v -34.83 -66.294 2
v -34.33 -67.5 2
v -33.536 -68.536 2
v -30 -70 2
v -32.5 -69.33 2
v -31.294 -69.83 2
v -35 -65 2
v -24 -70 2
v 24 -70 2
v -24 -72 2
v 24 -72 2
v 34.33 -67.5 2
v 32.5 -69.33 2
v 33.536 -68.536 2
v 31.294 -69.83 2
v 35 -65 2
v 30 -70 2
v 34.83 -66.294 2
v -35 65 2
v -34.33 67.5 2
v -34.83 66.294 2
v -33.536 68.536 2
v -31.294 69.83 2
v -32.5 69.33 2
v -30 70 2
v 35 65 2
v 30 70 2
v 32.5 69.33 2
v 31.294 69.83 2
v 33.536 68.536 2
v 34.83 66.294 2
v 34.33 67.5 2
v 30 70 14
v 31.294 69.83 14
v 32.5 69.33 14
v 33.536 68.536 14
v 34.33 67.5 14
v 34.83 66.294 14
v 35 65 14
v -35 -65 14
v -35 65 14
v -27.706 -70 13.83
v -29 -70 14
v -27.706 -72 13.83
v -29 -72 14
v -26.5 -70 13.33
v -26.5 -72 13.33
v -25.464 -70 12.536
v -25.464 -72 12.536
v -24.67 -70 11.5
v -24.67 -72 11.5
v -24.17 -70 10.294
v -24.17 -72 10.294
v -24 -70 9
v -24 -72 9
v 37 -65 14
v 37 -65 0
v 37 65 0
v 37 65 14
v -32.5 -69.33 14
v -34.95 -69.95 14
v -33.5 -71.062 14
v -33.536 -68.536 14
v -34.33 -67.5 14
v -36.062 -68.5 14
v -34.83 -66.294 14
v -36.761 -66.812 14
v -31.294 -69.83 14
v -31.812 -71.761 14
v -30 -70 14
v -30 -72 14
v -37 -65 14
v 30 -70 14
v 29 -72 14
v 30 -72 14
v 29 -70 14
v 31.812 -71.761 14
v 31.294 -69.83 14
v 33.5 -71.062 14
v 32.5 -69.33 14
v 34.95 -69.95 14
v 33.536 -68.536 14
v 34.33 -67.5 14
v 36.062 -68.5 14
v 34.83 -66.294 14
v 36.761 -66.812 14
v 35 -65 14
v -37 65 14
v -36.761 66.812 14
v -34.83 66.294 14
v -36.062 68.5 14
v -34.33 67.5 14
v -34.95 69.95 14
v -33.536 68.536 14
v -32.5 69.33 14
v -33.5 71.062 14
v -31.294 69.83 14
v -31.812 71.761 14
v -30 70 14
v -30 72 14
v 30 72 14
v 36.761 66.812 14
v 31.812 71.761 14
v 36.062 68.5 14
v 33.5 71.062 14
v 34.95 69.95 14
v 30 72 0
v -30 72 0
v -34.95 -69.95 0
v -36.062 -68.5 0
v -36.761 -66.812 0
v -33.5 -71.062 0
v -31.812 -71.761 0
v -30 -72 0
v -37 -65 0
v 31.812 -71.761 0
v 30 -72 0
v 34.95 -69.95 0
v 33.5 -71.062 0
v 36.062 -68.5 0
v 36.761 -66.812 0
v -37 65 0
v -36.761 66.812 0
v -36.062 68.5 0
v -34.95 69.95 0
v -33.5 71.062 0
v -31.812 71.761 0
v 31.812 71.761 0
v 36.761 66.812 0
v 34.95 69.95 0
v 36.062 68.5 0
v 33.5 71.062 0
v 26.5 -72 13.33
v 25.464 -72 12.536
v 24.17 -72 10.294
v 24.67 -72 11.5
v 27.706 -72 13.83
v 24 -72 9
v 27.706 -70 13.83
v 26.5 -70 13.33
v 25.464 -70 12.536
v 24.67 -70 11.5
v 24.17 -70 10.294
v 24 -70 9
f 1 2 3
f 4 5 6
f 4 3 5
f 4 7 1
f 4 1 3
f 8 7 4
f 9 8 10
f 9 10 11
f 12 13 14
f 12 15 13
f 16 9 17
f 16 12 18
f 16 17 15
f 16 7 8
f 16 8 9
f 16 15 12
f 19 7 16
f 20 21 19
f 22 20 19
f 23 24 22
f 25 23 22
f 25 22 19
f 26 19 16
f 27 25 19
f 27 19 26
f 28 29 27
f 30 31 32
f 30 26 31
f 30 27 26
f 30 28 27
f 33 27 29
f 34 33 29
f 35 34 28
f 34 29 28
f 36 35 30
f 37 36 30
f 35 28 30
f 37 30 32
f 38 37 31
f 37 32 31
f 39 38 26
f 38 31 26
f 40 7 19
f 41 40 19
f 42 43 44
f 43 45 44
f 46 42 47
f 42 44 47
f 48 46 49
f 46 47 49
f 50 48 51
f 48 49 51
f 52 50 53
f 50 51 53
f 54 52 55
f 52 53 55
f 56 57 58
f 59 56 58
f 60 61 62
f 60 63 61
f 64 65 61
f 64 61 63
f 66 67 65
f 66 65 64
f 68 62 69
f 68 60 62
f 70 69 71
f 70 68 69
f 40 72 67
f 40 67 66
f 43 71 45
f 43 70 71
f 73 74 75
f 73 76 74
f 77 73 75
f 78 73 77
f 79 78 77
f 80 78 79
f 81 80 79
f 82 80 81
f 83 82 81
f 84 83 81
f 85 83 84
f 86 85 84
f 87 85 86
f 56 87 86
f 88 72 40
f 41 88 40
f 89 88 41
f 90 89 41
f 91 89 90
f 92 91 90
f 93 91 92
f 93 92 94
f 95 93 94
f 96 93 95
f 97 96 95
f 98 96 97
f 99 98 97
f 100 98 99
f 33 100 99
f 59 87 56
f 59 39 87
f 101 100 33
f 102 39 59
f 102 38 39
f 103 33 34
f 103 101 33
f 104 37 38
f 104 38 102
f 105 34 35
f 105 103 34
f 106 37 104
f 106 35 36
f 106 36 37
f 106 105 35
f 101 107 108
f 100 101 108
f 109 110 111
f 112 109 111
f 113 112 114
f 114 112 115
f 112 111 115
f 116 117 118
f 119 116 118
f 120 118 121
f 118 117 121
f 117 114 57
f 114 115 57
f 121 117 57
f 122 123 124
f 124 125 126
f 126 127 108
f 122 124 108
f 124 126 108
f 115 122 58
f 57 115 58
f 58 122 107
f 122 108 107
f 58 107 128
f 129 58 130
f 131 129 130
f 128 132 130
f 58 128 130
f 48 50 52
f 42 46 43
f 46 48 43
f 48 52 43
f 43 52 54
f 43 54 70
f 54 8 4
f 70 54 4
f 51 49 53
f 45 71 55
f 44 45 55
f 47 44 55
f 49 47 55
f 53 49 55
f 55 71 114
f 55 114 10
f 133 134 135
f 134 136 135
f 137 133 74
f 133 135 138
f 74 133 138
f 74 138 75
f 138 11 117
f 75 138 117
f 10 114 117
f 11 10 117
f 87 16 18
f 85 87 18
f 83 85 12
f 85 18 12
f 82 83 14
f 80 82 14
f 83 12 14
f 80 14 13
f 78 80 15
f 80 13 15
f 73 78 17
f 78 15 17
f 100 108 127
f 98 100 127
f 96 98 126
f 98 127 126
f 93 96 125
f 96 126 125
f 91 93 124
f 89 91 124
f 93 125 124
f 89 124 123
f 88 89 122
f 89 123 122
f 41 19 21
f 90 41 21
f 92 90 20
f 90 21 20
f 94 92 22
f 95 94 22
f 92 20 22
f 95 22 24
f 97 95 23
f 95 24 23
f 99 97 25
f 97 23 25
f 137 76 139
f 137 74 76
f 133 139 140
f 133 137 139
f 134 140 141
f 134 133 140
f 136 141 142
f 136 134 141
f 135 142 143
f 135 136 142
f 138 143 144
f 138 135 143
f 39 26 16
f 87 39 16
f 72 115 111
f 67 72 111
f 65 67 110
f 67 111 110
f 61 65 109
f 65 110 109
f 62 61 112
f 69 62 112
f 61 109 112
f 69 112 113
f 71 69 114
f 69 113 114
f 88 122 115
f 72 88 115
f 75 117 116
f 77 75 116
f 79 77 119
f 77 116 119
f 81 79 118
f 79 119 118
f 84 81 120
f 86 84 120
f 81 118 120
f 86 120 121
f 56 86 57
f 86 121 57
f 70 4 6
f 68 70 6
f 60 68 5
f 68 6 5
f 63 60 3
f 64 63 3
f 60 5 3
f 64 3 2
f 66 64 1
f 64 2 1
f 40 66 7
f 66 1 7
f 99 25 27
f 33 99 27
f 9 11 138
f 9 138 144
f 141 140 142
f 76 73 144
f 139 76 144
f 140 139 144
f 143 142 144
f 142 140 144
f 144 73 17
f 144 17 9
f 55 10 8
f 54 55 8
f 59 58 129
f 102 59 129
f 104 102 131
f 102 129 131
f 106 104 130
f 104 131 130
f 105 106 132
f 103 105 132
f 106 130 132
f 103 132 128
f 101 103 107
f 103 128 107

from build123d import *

# Parameters (mm, degrees)
F1_DEPTH = 2
F2_DEPTH = 14
F3_W     = 48
F3_H     = 15.884124
F4_DEPTH = 25
F5_R     = 5


with BuildPart() as f1:
    # F0 (on Top) → F1 (new body)
    with BuildSketch(Plane.XY):
        with BuildLine():
            ThreePointArc((37, 65), (34.949747, 69.949747), (30, 72))
            Line((30, 72), (-30, 72))
            ThreePointArc((-30, 72), (-34.949747, 69.949747), (-37, 65))
            Line((-37, 65), (-37, -65))
            ThreePointArc((-37, -65), (-34.949747, -69.949747), (-30, -72))
            Line((-30, -72), (30, -72))
            ThreePointArc((30, -72), (34.949747, -69.949747), (37, -65))
            Line((37, -65), (37, 65))
        make_face()
        with BuildLine():
            Line((-30, 70), (30, 70))
            ThreePointArc((30, 70), (33.535534, 68.535534), (35, 65))
            Line((35, 65), (35, -65))
            ThreePointArc((35, -65), (33.535534, -68.535534), (30, -70))
            Line((30, -70), (-30, -70))
            ThreePointArc((-30, -70), (-33.535534, -68.535534), (-35, -65))
            Line((-35, -65), (-35, 65))
            ThreePointArc((-35, 65), (-33.535534, 68.535534), (-30, 70))
        make_face(mode=Mode.SUBTRACT)
        with BuildLine():
            ThreePointArc((35, 65), (33.535534, 68.535534), (30, 70))
            Line((30, 70), (-30, 70))
            ThreePointArc((-30, 70), (-33.535534, 68.535534), (-35, 65))
            Line((-35, 65), (-35, -65))
            ThreePointArc((-35, -65), (-33.535534, -68.535534), (-30, -70))
            Line((-30, -70), (30, -70))
            ThreePointArc((30, -70), (33.535534, -68.535534), (35, -65))
            Line((35, -65), (35, 65))
        make_face()
    extrude(amount=F1_DEPTH)

    # F0 (on Top) → F2 (join)
    with BuildSketch(Plane.XY):
        with BuildLine():
            ThreePointArc((37, 65), (34.949747, 69.949747), (30, 72))
            Line((30, 72), (-30, 72))
            ThreePointArc((-30, 72), (-34.949747, 69.949747), (-37, 65))
            Line((-37, 65), (-37, -65))
            ThreePointArc((-37, -65), (-34.949747, -69.949747), (-30, -72))
            Line((-30, -72), (30, -72))
            ThreePointArc((30, -72), (34.949747, -69.949747), (37, -65))
            Line((37, -65), (37, 65))
        make_face()
        with BuildLine():
            Line((-30, 70), (30, 70))
            ThreePointArc((30, 70), (33.535534, 68.535534), (35, 65))
            Line((35, 65), (35, -65))
            ThreePointArc((35, -65), (33.535534, -68.535534), (30, -70))
            Line((30, -70), (-30, -70))
            ThreePointArc((-30, -70), (-33.535534, -68.535534), (-35, -65))
            Line((-35, -65), (-35, 65))
            ThreePointArc((-35, 65), (-33.535534, 68.535534), (-30, 70))
        make_face(mode=Mode.SUBTRACT)
    extrude(amount=F2_DEPTH)

    # F3 (on face) → F4 (cut)
    with BuildSketch(Plane.XY.offset(2)):
        with Locations((0, -70)):
            Rectangle(F3_W, F3_H)
    extrude(amount=F4_DEPTH, mode=Mode.SUBTRACT)

    # F5
    f5_edges = [f1.edges().sort_by_distance(p)[0] for p in [
        (-24, -71, 14),
        (24, -71, 14),
    ]]
    fillet(f5_edges, radius=F5_R)


solid = f1.part
